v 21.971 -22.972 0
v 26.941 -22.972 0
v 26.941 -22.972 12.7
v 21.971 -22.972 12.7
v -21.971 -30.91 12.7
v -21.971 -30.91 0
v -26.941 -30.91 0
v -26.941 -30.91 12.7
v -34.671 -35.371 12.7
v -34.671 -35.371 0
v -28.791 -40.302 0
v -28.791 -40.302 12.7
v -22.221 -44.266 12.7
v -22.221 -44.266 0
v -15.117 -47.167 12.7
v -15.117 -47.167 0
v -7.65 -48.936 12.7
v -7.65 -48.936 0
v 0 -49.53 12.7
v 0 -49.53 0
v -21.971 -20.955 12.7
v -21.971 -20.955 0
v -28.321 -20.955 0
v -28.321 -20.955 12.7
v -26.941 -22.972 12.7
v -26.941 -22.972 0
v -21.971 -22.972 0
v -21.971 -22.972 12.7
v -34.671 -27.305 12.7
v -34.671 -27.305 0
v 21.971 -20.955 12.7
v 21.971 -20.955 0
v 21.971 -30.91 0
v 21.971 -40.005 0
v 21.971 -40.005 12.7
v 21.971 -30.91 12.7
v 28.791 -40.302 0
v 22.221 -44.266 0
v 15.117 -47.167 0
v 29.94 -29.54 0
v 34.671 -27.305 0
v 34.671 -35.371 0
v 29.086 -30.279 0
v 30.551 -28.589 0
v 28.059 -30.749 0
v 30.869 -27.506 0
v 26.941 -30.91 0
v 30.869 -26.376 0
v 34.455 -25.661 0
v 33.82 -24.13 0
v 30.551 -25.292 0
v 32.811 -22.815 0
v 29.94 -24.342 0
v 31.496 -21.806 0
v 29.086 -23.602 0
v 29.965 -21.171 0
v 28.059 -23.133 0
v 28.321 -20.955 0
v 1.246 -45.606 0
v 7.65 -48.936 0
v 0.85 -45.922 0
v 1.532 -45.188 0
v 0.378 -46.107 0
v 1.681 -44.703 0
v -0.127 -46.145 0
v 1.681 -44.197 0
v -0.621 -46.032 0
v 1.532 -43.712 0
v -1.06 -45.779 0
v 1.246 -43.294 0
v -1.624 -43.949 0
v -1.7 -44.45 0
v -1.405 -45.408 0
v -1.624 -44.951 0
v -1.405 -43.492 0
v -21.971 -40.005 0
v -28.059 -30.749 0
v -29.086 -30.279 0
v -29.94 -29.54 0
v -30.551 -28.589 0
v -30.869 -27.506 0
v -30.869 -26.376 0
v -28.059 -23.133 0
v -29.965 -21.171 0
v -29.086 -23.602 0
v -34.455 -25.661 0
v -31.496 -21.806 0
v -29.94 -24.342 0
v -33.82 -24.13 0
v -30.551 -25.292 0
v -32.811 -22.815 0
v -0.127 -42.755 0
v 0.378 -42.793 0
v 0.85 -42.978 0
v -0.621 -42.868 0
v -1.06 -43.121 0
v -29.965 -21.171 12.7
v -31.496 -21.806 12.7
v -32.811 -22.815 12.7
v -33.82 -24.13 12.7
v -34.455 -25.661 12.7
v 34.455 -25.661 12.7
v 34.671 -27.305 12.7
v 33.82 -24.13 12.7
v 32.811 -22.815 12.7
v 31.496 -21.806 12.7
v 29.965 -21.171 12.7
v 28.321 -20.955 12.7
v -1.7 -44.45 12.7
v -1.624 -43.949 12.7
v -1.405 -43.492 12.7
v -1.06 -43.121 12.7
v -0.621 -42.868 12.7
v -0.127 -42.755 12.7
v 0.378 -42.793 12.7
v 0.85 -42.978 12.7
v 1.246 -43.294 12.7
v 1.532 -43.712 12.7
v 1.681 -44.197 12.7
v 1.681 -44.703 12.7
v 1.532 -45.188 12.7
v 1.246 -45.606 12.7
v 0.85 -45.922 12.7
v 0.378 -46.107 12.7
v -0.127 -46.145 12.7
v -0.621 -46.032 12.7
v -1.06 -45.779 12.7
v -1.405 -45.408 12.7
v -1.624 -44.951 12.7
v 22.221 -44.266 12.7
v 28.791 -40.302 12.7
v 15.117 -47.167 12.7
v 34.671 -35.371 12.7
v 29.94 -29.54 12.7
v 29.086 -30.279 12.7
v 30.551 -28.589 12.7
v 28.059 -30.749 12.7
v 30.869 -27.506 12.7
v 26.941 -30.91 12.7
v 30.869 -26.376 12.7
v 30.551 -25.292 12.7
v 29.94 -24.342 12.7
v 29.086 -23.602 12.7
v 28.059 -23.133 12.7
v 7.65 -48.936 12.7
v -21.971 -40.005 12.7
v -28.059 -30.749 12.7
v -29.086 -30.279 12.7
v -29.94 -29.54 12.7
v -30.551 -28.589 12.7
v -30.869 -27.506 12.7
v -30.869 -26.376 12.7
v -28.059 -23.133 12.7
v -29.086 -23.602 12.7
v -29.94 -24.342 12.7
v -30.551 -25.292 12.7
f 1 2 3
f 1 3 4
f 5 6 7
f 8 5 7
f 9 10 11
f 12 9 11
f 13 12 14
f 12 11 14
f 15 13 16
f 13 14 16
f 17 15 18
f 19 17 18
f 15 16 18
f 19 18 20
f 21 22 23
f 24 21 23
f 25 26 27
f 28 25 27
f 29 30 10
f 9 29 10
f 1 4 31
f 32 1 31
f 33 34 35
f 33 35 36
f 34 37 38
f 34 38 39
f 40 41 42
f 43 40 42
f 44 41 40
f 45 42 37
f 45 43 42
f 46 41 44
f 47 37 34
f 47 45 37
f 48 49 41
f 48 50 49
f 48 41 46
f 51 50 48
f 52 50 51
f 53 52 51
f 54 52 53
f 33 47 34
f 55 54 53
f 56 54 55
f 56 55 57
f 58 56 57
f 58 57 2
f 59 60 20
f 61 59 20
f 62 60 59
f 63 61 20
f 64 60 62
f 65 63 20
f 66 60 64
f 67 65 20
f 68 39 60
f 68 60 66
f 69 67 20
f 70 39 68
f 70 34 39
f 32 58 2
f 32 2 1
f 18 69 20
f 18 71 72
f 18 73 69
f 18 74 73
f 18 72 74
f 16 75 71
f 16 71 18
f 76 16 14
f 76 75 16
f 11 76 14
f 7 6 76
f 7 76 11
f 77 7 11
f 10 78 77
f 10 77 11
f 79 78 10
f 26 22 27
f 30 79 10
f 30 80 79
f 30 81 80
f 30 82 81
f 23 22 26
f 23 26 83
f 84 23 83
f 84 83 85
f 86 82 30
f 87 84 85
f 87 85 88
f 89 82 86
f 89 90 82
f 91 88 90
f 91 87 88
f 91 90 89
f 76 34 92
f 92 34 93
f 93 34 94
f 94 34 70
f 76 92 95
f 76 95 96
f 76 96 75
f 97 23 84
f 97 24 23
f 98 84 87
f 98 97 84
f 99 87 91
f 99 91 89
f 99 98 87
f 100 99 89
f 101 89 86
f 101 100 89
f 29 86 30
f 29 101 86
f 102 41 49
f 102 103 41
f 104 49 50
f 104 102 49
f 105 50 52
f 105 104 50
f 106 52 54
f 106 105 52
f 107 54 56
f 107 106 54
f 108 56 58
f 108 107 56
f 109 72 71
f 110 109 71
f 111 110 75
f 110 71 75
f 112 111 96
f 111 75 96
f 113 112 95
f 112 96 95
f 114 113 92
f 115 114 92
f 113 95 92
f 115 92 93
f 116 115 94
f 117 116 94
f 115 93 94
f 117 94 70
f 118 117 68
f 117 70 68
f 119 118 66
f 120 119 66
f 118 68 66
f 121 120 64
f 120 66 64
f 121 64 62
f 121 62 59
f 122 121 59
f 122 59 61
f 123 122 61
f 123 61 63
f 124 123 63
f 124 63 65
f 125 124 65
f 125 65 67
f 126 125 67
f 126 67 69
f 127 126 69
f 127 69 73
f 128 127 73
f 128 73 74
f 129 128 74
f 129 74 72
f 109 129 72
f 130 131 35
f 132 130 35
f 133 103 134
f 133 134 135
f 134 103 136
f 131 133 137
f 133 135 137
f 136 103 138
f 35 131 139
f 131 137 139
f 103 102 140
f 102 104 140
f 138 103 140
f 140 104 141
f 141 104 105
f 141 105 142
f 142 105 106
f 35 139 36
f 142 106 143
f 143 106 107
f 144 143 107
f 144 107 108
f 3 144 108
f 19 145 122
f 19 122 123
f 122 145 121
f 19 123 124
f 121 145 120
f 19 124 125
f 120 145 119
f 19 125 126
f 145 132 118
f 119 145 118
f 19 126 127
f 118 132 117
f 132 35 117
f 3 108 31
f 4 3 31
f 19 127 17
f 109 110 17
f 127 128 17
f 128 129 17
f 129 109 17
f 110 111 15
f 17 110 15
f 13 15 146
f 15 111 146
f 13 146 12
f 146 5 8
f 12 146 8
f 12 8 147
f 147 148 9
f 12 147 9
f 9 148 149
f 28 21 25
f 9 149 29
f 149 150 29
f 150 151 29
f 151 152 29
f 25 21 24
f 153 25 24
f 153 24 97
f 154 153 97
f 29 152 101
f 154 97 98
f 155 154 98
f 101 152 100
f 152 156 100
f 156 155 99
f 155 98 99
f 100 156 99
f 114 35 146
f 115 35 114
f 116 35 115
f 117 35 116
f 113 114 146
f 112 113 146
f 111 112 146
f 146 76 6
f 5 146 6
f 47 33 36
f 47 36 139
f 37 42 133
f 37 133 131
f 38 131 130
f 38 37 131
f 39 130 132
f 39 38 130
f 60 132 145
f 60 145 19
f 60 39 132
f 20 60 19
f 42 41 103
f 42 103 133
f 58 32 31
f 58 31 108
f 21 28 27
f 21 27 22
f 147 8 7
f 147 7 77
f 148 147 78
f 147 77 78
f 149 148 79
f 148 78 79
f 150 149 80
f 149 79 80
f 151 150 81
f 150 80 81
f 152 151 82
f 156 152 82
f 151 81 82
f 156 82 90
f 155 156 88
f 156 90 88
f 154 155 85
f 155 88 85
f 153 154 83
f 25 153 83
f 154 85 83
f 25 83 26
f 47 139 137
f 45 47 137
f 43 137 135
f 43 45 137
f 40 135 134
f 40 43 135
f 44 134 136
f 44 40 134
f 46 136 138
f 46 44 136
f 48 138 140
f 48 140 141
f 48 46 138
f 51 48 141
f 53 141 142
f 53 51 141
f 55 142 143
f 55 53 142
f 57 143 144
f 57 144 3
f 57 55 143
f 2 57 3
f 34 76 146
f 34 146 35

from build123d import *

# Parameters (mm, degrees)
BOSS_EXTRUDE1_DEPTH  = 12.7
FILLET1_R            = 6.35
M3_CLEARANCE_HOLE1_D = 3.4


with BuildPart() as part:
    # Sketch2 → Boss-Extrude1 (new body)
    with BuildSketch(Plane.XY):
        with BuildLine():
            Line((-34.671, -20.955), (-34.671, -35.371495007))
            ThreePointArc((-34.671, -35.371495007), (-18.725260376, -45.85395865), (0, -49.53))
            Line((0, -49.53), (0, -40.005))
            Line((0, -40.005), (-21.971, -40.005))
            Line((-21.971, -40.005), (-21.971, -30.909518363))
            Line((-21.971, -30.909518363), (-26.940768363, -30.909518363))
            ThreePointArc((-26.940768363, -30.909518363), (-30.909518363, -26.940768363), (-26.940768363, -22.972018363))
            Line((-26.940768363, -22.972018363), (-21.971, -22.972018363))
            Line((-21.971, -22.972018363), (-21.971, -20.955))
            Line((-21.971, -20.955), (-34.671, -20.955))
        make_face()
    boss_extrude1 = extrude(amount=BOSS_EXTRUDE1_DEPTH)

    # Mirror1: Boss-Extrude1 across plane
    add(boss_extrude1.mirror(Plane(origin=(0, -40.005, 12.7), x_dir=(0, 0, 1), z_dir=(-1, 0, 0))))

    # Fillet1
    fillet1_edges = [part.edges().sort_by_distance(p)[0] for p in [
        (-34.671, -20.955, 6.35),
        (34.671, -20.955, 6.35),
    ]]
    fillet(fillet1_edges, radius=FILLET1_R)

    # M3 Clearance Hole1 (through all)
    with Locations(Plane.XY.offset(12.7)):
        with Locations((0, -44.45)):
            Hole(M3_CLEARANCE_HOLE1_D / 2)


solid = part.part
